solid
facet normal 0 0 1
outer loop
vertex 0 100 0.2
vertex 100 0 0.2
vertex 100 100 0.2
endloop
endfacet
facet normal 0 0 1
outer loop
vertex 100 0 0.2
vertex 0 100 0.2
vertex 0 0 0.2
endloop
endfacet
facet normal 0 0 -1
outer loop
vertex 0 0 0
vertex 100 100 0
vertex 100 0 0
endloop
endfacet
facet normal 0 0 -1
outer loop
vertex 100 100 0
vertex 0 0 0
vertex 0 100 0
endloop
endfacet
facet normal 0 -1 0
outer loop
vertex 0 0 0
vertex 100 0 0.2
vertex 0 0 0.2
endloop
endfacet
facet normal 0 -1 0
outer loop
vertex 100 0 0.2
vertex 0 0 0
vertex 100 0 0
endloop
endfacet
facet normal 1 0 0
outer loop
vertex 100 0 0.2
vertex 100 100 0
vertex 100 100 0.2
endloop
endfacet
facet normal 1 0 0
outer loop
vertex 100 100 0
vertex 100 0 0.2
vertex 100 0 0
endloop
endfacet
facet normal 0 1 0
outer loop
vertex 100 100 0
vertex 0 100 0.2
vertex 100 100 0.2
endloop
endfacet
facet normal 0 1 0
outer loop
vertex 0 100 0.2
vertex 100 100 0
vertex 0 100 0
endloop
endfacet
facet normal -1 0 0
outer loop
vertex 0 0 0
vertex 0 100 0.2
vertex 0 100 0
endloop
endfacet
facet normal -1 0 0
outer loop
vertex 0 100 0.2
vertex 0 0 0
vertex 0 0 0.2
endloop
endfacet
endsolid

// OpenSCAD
countIdx=0;
size=100;
offset=size+10;
for (i=[0:countIdx])
    for (j=[0:countIdx])
        translate([i*offset,j*offset,0]) cube([size,size,.2]);
